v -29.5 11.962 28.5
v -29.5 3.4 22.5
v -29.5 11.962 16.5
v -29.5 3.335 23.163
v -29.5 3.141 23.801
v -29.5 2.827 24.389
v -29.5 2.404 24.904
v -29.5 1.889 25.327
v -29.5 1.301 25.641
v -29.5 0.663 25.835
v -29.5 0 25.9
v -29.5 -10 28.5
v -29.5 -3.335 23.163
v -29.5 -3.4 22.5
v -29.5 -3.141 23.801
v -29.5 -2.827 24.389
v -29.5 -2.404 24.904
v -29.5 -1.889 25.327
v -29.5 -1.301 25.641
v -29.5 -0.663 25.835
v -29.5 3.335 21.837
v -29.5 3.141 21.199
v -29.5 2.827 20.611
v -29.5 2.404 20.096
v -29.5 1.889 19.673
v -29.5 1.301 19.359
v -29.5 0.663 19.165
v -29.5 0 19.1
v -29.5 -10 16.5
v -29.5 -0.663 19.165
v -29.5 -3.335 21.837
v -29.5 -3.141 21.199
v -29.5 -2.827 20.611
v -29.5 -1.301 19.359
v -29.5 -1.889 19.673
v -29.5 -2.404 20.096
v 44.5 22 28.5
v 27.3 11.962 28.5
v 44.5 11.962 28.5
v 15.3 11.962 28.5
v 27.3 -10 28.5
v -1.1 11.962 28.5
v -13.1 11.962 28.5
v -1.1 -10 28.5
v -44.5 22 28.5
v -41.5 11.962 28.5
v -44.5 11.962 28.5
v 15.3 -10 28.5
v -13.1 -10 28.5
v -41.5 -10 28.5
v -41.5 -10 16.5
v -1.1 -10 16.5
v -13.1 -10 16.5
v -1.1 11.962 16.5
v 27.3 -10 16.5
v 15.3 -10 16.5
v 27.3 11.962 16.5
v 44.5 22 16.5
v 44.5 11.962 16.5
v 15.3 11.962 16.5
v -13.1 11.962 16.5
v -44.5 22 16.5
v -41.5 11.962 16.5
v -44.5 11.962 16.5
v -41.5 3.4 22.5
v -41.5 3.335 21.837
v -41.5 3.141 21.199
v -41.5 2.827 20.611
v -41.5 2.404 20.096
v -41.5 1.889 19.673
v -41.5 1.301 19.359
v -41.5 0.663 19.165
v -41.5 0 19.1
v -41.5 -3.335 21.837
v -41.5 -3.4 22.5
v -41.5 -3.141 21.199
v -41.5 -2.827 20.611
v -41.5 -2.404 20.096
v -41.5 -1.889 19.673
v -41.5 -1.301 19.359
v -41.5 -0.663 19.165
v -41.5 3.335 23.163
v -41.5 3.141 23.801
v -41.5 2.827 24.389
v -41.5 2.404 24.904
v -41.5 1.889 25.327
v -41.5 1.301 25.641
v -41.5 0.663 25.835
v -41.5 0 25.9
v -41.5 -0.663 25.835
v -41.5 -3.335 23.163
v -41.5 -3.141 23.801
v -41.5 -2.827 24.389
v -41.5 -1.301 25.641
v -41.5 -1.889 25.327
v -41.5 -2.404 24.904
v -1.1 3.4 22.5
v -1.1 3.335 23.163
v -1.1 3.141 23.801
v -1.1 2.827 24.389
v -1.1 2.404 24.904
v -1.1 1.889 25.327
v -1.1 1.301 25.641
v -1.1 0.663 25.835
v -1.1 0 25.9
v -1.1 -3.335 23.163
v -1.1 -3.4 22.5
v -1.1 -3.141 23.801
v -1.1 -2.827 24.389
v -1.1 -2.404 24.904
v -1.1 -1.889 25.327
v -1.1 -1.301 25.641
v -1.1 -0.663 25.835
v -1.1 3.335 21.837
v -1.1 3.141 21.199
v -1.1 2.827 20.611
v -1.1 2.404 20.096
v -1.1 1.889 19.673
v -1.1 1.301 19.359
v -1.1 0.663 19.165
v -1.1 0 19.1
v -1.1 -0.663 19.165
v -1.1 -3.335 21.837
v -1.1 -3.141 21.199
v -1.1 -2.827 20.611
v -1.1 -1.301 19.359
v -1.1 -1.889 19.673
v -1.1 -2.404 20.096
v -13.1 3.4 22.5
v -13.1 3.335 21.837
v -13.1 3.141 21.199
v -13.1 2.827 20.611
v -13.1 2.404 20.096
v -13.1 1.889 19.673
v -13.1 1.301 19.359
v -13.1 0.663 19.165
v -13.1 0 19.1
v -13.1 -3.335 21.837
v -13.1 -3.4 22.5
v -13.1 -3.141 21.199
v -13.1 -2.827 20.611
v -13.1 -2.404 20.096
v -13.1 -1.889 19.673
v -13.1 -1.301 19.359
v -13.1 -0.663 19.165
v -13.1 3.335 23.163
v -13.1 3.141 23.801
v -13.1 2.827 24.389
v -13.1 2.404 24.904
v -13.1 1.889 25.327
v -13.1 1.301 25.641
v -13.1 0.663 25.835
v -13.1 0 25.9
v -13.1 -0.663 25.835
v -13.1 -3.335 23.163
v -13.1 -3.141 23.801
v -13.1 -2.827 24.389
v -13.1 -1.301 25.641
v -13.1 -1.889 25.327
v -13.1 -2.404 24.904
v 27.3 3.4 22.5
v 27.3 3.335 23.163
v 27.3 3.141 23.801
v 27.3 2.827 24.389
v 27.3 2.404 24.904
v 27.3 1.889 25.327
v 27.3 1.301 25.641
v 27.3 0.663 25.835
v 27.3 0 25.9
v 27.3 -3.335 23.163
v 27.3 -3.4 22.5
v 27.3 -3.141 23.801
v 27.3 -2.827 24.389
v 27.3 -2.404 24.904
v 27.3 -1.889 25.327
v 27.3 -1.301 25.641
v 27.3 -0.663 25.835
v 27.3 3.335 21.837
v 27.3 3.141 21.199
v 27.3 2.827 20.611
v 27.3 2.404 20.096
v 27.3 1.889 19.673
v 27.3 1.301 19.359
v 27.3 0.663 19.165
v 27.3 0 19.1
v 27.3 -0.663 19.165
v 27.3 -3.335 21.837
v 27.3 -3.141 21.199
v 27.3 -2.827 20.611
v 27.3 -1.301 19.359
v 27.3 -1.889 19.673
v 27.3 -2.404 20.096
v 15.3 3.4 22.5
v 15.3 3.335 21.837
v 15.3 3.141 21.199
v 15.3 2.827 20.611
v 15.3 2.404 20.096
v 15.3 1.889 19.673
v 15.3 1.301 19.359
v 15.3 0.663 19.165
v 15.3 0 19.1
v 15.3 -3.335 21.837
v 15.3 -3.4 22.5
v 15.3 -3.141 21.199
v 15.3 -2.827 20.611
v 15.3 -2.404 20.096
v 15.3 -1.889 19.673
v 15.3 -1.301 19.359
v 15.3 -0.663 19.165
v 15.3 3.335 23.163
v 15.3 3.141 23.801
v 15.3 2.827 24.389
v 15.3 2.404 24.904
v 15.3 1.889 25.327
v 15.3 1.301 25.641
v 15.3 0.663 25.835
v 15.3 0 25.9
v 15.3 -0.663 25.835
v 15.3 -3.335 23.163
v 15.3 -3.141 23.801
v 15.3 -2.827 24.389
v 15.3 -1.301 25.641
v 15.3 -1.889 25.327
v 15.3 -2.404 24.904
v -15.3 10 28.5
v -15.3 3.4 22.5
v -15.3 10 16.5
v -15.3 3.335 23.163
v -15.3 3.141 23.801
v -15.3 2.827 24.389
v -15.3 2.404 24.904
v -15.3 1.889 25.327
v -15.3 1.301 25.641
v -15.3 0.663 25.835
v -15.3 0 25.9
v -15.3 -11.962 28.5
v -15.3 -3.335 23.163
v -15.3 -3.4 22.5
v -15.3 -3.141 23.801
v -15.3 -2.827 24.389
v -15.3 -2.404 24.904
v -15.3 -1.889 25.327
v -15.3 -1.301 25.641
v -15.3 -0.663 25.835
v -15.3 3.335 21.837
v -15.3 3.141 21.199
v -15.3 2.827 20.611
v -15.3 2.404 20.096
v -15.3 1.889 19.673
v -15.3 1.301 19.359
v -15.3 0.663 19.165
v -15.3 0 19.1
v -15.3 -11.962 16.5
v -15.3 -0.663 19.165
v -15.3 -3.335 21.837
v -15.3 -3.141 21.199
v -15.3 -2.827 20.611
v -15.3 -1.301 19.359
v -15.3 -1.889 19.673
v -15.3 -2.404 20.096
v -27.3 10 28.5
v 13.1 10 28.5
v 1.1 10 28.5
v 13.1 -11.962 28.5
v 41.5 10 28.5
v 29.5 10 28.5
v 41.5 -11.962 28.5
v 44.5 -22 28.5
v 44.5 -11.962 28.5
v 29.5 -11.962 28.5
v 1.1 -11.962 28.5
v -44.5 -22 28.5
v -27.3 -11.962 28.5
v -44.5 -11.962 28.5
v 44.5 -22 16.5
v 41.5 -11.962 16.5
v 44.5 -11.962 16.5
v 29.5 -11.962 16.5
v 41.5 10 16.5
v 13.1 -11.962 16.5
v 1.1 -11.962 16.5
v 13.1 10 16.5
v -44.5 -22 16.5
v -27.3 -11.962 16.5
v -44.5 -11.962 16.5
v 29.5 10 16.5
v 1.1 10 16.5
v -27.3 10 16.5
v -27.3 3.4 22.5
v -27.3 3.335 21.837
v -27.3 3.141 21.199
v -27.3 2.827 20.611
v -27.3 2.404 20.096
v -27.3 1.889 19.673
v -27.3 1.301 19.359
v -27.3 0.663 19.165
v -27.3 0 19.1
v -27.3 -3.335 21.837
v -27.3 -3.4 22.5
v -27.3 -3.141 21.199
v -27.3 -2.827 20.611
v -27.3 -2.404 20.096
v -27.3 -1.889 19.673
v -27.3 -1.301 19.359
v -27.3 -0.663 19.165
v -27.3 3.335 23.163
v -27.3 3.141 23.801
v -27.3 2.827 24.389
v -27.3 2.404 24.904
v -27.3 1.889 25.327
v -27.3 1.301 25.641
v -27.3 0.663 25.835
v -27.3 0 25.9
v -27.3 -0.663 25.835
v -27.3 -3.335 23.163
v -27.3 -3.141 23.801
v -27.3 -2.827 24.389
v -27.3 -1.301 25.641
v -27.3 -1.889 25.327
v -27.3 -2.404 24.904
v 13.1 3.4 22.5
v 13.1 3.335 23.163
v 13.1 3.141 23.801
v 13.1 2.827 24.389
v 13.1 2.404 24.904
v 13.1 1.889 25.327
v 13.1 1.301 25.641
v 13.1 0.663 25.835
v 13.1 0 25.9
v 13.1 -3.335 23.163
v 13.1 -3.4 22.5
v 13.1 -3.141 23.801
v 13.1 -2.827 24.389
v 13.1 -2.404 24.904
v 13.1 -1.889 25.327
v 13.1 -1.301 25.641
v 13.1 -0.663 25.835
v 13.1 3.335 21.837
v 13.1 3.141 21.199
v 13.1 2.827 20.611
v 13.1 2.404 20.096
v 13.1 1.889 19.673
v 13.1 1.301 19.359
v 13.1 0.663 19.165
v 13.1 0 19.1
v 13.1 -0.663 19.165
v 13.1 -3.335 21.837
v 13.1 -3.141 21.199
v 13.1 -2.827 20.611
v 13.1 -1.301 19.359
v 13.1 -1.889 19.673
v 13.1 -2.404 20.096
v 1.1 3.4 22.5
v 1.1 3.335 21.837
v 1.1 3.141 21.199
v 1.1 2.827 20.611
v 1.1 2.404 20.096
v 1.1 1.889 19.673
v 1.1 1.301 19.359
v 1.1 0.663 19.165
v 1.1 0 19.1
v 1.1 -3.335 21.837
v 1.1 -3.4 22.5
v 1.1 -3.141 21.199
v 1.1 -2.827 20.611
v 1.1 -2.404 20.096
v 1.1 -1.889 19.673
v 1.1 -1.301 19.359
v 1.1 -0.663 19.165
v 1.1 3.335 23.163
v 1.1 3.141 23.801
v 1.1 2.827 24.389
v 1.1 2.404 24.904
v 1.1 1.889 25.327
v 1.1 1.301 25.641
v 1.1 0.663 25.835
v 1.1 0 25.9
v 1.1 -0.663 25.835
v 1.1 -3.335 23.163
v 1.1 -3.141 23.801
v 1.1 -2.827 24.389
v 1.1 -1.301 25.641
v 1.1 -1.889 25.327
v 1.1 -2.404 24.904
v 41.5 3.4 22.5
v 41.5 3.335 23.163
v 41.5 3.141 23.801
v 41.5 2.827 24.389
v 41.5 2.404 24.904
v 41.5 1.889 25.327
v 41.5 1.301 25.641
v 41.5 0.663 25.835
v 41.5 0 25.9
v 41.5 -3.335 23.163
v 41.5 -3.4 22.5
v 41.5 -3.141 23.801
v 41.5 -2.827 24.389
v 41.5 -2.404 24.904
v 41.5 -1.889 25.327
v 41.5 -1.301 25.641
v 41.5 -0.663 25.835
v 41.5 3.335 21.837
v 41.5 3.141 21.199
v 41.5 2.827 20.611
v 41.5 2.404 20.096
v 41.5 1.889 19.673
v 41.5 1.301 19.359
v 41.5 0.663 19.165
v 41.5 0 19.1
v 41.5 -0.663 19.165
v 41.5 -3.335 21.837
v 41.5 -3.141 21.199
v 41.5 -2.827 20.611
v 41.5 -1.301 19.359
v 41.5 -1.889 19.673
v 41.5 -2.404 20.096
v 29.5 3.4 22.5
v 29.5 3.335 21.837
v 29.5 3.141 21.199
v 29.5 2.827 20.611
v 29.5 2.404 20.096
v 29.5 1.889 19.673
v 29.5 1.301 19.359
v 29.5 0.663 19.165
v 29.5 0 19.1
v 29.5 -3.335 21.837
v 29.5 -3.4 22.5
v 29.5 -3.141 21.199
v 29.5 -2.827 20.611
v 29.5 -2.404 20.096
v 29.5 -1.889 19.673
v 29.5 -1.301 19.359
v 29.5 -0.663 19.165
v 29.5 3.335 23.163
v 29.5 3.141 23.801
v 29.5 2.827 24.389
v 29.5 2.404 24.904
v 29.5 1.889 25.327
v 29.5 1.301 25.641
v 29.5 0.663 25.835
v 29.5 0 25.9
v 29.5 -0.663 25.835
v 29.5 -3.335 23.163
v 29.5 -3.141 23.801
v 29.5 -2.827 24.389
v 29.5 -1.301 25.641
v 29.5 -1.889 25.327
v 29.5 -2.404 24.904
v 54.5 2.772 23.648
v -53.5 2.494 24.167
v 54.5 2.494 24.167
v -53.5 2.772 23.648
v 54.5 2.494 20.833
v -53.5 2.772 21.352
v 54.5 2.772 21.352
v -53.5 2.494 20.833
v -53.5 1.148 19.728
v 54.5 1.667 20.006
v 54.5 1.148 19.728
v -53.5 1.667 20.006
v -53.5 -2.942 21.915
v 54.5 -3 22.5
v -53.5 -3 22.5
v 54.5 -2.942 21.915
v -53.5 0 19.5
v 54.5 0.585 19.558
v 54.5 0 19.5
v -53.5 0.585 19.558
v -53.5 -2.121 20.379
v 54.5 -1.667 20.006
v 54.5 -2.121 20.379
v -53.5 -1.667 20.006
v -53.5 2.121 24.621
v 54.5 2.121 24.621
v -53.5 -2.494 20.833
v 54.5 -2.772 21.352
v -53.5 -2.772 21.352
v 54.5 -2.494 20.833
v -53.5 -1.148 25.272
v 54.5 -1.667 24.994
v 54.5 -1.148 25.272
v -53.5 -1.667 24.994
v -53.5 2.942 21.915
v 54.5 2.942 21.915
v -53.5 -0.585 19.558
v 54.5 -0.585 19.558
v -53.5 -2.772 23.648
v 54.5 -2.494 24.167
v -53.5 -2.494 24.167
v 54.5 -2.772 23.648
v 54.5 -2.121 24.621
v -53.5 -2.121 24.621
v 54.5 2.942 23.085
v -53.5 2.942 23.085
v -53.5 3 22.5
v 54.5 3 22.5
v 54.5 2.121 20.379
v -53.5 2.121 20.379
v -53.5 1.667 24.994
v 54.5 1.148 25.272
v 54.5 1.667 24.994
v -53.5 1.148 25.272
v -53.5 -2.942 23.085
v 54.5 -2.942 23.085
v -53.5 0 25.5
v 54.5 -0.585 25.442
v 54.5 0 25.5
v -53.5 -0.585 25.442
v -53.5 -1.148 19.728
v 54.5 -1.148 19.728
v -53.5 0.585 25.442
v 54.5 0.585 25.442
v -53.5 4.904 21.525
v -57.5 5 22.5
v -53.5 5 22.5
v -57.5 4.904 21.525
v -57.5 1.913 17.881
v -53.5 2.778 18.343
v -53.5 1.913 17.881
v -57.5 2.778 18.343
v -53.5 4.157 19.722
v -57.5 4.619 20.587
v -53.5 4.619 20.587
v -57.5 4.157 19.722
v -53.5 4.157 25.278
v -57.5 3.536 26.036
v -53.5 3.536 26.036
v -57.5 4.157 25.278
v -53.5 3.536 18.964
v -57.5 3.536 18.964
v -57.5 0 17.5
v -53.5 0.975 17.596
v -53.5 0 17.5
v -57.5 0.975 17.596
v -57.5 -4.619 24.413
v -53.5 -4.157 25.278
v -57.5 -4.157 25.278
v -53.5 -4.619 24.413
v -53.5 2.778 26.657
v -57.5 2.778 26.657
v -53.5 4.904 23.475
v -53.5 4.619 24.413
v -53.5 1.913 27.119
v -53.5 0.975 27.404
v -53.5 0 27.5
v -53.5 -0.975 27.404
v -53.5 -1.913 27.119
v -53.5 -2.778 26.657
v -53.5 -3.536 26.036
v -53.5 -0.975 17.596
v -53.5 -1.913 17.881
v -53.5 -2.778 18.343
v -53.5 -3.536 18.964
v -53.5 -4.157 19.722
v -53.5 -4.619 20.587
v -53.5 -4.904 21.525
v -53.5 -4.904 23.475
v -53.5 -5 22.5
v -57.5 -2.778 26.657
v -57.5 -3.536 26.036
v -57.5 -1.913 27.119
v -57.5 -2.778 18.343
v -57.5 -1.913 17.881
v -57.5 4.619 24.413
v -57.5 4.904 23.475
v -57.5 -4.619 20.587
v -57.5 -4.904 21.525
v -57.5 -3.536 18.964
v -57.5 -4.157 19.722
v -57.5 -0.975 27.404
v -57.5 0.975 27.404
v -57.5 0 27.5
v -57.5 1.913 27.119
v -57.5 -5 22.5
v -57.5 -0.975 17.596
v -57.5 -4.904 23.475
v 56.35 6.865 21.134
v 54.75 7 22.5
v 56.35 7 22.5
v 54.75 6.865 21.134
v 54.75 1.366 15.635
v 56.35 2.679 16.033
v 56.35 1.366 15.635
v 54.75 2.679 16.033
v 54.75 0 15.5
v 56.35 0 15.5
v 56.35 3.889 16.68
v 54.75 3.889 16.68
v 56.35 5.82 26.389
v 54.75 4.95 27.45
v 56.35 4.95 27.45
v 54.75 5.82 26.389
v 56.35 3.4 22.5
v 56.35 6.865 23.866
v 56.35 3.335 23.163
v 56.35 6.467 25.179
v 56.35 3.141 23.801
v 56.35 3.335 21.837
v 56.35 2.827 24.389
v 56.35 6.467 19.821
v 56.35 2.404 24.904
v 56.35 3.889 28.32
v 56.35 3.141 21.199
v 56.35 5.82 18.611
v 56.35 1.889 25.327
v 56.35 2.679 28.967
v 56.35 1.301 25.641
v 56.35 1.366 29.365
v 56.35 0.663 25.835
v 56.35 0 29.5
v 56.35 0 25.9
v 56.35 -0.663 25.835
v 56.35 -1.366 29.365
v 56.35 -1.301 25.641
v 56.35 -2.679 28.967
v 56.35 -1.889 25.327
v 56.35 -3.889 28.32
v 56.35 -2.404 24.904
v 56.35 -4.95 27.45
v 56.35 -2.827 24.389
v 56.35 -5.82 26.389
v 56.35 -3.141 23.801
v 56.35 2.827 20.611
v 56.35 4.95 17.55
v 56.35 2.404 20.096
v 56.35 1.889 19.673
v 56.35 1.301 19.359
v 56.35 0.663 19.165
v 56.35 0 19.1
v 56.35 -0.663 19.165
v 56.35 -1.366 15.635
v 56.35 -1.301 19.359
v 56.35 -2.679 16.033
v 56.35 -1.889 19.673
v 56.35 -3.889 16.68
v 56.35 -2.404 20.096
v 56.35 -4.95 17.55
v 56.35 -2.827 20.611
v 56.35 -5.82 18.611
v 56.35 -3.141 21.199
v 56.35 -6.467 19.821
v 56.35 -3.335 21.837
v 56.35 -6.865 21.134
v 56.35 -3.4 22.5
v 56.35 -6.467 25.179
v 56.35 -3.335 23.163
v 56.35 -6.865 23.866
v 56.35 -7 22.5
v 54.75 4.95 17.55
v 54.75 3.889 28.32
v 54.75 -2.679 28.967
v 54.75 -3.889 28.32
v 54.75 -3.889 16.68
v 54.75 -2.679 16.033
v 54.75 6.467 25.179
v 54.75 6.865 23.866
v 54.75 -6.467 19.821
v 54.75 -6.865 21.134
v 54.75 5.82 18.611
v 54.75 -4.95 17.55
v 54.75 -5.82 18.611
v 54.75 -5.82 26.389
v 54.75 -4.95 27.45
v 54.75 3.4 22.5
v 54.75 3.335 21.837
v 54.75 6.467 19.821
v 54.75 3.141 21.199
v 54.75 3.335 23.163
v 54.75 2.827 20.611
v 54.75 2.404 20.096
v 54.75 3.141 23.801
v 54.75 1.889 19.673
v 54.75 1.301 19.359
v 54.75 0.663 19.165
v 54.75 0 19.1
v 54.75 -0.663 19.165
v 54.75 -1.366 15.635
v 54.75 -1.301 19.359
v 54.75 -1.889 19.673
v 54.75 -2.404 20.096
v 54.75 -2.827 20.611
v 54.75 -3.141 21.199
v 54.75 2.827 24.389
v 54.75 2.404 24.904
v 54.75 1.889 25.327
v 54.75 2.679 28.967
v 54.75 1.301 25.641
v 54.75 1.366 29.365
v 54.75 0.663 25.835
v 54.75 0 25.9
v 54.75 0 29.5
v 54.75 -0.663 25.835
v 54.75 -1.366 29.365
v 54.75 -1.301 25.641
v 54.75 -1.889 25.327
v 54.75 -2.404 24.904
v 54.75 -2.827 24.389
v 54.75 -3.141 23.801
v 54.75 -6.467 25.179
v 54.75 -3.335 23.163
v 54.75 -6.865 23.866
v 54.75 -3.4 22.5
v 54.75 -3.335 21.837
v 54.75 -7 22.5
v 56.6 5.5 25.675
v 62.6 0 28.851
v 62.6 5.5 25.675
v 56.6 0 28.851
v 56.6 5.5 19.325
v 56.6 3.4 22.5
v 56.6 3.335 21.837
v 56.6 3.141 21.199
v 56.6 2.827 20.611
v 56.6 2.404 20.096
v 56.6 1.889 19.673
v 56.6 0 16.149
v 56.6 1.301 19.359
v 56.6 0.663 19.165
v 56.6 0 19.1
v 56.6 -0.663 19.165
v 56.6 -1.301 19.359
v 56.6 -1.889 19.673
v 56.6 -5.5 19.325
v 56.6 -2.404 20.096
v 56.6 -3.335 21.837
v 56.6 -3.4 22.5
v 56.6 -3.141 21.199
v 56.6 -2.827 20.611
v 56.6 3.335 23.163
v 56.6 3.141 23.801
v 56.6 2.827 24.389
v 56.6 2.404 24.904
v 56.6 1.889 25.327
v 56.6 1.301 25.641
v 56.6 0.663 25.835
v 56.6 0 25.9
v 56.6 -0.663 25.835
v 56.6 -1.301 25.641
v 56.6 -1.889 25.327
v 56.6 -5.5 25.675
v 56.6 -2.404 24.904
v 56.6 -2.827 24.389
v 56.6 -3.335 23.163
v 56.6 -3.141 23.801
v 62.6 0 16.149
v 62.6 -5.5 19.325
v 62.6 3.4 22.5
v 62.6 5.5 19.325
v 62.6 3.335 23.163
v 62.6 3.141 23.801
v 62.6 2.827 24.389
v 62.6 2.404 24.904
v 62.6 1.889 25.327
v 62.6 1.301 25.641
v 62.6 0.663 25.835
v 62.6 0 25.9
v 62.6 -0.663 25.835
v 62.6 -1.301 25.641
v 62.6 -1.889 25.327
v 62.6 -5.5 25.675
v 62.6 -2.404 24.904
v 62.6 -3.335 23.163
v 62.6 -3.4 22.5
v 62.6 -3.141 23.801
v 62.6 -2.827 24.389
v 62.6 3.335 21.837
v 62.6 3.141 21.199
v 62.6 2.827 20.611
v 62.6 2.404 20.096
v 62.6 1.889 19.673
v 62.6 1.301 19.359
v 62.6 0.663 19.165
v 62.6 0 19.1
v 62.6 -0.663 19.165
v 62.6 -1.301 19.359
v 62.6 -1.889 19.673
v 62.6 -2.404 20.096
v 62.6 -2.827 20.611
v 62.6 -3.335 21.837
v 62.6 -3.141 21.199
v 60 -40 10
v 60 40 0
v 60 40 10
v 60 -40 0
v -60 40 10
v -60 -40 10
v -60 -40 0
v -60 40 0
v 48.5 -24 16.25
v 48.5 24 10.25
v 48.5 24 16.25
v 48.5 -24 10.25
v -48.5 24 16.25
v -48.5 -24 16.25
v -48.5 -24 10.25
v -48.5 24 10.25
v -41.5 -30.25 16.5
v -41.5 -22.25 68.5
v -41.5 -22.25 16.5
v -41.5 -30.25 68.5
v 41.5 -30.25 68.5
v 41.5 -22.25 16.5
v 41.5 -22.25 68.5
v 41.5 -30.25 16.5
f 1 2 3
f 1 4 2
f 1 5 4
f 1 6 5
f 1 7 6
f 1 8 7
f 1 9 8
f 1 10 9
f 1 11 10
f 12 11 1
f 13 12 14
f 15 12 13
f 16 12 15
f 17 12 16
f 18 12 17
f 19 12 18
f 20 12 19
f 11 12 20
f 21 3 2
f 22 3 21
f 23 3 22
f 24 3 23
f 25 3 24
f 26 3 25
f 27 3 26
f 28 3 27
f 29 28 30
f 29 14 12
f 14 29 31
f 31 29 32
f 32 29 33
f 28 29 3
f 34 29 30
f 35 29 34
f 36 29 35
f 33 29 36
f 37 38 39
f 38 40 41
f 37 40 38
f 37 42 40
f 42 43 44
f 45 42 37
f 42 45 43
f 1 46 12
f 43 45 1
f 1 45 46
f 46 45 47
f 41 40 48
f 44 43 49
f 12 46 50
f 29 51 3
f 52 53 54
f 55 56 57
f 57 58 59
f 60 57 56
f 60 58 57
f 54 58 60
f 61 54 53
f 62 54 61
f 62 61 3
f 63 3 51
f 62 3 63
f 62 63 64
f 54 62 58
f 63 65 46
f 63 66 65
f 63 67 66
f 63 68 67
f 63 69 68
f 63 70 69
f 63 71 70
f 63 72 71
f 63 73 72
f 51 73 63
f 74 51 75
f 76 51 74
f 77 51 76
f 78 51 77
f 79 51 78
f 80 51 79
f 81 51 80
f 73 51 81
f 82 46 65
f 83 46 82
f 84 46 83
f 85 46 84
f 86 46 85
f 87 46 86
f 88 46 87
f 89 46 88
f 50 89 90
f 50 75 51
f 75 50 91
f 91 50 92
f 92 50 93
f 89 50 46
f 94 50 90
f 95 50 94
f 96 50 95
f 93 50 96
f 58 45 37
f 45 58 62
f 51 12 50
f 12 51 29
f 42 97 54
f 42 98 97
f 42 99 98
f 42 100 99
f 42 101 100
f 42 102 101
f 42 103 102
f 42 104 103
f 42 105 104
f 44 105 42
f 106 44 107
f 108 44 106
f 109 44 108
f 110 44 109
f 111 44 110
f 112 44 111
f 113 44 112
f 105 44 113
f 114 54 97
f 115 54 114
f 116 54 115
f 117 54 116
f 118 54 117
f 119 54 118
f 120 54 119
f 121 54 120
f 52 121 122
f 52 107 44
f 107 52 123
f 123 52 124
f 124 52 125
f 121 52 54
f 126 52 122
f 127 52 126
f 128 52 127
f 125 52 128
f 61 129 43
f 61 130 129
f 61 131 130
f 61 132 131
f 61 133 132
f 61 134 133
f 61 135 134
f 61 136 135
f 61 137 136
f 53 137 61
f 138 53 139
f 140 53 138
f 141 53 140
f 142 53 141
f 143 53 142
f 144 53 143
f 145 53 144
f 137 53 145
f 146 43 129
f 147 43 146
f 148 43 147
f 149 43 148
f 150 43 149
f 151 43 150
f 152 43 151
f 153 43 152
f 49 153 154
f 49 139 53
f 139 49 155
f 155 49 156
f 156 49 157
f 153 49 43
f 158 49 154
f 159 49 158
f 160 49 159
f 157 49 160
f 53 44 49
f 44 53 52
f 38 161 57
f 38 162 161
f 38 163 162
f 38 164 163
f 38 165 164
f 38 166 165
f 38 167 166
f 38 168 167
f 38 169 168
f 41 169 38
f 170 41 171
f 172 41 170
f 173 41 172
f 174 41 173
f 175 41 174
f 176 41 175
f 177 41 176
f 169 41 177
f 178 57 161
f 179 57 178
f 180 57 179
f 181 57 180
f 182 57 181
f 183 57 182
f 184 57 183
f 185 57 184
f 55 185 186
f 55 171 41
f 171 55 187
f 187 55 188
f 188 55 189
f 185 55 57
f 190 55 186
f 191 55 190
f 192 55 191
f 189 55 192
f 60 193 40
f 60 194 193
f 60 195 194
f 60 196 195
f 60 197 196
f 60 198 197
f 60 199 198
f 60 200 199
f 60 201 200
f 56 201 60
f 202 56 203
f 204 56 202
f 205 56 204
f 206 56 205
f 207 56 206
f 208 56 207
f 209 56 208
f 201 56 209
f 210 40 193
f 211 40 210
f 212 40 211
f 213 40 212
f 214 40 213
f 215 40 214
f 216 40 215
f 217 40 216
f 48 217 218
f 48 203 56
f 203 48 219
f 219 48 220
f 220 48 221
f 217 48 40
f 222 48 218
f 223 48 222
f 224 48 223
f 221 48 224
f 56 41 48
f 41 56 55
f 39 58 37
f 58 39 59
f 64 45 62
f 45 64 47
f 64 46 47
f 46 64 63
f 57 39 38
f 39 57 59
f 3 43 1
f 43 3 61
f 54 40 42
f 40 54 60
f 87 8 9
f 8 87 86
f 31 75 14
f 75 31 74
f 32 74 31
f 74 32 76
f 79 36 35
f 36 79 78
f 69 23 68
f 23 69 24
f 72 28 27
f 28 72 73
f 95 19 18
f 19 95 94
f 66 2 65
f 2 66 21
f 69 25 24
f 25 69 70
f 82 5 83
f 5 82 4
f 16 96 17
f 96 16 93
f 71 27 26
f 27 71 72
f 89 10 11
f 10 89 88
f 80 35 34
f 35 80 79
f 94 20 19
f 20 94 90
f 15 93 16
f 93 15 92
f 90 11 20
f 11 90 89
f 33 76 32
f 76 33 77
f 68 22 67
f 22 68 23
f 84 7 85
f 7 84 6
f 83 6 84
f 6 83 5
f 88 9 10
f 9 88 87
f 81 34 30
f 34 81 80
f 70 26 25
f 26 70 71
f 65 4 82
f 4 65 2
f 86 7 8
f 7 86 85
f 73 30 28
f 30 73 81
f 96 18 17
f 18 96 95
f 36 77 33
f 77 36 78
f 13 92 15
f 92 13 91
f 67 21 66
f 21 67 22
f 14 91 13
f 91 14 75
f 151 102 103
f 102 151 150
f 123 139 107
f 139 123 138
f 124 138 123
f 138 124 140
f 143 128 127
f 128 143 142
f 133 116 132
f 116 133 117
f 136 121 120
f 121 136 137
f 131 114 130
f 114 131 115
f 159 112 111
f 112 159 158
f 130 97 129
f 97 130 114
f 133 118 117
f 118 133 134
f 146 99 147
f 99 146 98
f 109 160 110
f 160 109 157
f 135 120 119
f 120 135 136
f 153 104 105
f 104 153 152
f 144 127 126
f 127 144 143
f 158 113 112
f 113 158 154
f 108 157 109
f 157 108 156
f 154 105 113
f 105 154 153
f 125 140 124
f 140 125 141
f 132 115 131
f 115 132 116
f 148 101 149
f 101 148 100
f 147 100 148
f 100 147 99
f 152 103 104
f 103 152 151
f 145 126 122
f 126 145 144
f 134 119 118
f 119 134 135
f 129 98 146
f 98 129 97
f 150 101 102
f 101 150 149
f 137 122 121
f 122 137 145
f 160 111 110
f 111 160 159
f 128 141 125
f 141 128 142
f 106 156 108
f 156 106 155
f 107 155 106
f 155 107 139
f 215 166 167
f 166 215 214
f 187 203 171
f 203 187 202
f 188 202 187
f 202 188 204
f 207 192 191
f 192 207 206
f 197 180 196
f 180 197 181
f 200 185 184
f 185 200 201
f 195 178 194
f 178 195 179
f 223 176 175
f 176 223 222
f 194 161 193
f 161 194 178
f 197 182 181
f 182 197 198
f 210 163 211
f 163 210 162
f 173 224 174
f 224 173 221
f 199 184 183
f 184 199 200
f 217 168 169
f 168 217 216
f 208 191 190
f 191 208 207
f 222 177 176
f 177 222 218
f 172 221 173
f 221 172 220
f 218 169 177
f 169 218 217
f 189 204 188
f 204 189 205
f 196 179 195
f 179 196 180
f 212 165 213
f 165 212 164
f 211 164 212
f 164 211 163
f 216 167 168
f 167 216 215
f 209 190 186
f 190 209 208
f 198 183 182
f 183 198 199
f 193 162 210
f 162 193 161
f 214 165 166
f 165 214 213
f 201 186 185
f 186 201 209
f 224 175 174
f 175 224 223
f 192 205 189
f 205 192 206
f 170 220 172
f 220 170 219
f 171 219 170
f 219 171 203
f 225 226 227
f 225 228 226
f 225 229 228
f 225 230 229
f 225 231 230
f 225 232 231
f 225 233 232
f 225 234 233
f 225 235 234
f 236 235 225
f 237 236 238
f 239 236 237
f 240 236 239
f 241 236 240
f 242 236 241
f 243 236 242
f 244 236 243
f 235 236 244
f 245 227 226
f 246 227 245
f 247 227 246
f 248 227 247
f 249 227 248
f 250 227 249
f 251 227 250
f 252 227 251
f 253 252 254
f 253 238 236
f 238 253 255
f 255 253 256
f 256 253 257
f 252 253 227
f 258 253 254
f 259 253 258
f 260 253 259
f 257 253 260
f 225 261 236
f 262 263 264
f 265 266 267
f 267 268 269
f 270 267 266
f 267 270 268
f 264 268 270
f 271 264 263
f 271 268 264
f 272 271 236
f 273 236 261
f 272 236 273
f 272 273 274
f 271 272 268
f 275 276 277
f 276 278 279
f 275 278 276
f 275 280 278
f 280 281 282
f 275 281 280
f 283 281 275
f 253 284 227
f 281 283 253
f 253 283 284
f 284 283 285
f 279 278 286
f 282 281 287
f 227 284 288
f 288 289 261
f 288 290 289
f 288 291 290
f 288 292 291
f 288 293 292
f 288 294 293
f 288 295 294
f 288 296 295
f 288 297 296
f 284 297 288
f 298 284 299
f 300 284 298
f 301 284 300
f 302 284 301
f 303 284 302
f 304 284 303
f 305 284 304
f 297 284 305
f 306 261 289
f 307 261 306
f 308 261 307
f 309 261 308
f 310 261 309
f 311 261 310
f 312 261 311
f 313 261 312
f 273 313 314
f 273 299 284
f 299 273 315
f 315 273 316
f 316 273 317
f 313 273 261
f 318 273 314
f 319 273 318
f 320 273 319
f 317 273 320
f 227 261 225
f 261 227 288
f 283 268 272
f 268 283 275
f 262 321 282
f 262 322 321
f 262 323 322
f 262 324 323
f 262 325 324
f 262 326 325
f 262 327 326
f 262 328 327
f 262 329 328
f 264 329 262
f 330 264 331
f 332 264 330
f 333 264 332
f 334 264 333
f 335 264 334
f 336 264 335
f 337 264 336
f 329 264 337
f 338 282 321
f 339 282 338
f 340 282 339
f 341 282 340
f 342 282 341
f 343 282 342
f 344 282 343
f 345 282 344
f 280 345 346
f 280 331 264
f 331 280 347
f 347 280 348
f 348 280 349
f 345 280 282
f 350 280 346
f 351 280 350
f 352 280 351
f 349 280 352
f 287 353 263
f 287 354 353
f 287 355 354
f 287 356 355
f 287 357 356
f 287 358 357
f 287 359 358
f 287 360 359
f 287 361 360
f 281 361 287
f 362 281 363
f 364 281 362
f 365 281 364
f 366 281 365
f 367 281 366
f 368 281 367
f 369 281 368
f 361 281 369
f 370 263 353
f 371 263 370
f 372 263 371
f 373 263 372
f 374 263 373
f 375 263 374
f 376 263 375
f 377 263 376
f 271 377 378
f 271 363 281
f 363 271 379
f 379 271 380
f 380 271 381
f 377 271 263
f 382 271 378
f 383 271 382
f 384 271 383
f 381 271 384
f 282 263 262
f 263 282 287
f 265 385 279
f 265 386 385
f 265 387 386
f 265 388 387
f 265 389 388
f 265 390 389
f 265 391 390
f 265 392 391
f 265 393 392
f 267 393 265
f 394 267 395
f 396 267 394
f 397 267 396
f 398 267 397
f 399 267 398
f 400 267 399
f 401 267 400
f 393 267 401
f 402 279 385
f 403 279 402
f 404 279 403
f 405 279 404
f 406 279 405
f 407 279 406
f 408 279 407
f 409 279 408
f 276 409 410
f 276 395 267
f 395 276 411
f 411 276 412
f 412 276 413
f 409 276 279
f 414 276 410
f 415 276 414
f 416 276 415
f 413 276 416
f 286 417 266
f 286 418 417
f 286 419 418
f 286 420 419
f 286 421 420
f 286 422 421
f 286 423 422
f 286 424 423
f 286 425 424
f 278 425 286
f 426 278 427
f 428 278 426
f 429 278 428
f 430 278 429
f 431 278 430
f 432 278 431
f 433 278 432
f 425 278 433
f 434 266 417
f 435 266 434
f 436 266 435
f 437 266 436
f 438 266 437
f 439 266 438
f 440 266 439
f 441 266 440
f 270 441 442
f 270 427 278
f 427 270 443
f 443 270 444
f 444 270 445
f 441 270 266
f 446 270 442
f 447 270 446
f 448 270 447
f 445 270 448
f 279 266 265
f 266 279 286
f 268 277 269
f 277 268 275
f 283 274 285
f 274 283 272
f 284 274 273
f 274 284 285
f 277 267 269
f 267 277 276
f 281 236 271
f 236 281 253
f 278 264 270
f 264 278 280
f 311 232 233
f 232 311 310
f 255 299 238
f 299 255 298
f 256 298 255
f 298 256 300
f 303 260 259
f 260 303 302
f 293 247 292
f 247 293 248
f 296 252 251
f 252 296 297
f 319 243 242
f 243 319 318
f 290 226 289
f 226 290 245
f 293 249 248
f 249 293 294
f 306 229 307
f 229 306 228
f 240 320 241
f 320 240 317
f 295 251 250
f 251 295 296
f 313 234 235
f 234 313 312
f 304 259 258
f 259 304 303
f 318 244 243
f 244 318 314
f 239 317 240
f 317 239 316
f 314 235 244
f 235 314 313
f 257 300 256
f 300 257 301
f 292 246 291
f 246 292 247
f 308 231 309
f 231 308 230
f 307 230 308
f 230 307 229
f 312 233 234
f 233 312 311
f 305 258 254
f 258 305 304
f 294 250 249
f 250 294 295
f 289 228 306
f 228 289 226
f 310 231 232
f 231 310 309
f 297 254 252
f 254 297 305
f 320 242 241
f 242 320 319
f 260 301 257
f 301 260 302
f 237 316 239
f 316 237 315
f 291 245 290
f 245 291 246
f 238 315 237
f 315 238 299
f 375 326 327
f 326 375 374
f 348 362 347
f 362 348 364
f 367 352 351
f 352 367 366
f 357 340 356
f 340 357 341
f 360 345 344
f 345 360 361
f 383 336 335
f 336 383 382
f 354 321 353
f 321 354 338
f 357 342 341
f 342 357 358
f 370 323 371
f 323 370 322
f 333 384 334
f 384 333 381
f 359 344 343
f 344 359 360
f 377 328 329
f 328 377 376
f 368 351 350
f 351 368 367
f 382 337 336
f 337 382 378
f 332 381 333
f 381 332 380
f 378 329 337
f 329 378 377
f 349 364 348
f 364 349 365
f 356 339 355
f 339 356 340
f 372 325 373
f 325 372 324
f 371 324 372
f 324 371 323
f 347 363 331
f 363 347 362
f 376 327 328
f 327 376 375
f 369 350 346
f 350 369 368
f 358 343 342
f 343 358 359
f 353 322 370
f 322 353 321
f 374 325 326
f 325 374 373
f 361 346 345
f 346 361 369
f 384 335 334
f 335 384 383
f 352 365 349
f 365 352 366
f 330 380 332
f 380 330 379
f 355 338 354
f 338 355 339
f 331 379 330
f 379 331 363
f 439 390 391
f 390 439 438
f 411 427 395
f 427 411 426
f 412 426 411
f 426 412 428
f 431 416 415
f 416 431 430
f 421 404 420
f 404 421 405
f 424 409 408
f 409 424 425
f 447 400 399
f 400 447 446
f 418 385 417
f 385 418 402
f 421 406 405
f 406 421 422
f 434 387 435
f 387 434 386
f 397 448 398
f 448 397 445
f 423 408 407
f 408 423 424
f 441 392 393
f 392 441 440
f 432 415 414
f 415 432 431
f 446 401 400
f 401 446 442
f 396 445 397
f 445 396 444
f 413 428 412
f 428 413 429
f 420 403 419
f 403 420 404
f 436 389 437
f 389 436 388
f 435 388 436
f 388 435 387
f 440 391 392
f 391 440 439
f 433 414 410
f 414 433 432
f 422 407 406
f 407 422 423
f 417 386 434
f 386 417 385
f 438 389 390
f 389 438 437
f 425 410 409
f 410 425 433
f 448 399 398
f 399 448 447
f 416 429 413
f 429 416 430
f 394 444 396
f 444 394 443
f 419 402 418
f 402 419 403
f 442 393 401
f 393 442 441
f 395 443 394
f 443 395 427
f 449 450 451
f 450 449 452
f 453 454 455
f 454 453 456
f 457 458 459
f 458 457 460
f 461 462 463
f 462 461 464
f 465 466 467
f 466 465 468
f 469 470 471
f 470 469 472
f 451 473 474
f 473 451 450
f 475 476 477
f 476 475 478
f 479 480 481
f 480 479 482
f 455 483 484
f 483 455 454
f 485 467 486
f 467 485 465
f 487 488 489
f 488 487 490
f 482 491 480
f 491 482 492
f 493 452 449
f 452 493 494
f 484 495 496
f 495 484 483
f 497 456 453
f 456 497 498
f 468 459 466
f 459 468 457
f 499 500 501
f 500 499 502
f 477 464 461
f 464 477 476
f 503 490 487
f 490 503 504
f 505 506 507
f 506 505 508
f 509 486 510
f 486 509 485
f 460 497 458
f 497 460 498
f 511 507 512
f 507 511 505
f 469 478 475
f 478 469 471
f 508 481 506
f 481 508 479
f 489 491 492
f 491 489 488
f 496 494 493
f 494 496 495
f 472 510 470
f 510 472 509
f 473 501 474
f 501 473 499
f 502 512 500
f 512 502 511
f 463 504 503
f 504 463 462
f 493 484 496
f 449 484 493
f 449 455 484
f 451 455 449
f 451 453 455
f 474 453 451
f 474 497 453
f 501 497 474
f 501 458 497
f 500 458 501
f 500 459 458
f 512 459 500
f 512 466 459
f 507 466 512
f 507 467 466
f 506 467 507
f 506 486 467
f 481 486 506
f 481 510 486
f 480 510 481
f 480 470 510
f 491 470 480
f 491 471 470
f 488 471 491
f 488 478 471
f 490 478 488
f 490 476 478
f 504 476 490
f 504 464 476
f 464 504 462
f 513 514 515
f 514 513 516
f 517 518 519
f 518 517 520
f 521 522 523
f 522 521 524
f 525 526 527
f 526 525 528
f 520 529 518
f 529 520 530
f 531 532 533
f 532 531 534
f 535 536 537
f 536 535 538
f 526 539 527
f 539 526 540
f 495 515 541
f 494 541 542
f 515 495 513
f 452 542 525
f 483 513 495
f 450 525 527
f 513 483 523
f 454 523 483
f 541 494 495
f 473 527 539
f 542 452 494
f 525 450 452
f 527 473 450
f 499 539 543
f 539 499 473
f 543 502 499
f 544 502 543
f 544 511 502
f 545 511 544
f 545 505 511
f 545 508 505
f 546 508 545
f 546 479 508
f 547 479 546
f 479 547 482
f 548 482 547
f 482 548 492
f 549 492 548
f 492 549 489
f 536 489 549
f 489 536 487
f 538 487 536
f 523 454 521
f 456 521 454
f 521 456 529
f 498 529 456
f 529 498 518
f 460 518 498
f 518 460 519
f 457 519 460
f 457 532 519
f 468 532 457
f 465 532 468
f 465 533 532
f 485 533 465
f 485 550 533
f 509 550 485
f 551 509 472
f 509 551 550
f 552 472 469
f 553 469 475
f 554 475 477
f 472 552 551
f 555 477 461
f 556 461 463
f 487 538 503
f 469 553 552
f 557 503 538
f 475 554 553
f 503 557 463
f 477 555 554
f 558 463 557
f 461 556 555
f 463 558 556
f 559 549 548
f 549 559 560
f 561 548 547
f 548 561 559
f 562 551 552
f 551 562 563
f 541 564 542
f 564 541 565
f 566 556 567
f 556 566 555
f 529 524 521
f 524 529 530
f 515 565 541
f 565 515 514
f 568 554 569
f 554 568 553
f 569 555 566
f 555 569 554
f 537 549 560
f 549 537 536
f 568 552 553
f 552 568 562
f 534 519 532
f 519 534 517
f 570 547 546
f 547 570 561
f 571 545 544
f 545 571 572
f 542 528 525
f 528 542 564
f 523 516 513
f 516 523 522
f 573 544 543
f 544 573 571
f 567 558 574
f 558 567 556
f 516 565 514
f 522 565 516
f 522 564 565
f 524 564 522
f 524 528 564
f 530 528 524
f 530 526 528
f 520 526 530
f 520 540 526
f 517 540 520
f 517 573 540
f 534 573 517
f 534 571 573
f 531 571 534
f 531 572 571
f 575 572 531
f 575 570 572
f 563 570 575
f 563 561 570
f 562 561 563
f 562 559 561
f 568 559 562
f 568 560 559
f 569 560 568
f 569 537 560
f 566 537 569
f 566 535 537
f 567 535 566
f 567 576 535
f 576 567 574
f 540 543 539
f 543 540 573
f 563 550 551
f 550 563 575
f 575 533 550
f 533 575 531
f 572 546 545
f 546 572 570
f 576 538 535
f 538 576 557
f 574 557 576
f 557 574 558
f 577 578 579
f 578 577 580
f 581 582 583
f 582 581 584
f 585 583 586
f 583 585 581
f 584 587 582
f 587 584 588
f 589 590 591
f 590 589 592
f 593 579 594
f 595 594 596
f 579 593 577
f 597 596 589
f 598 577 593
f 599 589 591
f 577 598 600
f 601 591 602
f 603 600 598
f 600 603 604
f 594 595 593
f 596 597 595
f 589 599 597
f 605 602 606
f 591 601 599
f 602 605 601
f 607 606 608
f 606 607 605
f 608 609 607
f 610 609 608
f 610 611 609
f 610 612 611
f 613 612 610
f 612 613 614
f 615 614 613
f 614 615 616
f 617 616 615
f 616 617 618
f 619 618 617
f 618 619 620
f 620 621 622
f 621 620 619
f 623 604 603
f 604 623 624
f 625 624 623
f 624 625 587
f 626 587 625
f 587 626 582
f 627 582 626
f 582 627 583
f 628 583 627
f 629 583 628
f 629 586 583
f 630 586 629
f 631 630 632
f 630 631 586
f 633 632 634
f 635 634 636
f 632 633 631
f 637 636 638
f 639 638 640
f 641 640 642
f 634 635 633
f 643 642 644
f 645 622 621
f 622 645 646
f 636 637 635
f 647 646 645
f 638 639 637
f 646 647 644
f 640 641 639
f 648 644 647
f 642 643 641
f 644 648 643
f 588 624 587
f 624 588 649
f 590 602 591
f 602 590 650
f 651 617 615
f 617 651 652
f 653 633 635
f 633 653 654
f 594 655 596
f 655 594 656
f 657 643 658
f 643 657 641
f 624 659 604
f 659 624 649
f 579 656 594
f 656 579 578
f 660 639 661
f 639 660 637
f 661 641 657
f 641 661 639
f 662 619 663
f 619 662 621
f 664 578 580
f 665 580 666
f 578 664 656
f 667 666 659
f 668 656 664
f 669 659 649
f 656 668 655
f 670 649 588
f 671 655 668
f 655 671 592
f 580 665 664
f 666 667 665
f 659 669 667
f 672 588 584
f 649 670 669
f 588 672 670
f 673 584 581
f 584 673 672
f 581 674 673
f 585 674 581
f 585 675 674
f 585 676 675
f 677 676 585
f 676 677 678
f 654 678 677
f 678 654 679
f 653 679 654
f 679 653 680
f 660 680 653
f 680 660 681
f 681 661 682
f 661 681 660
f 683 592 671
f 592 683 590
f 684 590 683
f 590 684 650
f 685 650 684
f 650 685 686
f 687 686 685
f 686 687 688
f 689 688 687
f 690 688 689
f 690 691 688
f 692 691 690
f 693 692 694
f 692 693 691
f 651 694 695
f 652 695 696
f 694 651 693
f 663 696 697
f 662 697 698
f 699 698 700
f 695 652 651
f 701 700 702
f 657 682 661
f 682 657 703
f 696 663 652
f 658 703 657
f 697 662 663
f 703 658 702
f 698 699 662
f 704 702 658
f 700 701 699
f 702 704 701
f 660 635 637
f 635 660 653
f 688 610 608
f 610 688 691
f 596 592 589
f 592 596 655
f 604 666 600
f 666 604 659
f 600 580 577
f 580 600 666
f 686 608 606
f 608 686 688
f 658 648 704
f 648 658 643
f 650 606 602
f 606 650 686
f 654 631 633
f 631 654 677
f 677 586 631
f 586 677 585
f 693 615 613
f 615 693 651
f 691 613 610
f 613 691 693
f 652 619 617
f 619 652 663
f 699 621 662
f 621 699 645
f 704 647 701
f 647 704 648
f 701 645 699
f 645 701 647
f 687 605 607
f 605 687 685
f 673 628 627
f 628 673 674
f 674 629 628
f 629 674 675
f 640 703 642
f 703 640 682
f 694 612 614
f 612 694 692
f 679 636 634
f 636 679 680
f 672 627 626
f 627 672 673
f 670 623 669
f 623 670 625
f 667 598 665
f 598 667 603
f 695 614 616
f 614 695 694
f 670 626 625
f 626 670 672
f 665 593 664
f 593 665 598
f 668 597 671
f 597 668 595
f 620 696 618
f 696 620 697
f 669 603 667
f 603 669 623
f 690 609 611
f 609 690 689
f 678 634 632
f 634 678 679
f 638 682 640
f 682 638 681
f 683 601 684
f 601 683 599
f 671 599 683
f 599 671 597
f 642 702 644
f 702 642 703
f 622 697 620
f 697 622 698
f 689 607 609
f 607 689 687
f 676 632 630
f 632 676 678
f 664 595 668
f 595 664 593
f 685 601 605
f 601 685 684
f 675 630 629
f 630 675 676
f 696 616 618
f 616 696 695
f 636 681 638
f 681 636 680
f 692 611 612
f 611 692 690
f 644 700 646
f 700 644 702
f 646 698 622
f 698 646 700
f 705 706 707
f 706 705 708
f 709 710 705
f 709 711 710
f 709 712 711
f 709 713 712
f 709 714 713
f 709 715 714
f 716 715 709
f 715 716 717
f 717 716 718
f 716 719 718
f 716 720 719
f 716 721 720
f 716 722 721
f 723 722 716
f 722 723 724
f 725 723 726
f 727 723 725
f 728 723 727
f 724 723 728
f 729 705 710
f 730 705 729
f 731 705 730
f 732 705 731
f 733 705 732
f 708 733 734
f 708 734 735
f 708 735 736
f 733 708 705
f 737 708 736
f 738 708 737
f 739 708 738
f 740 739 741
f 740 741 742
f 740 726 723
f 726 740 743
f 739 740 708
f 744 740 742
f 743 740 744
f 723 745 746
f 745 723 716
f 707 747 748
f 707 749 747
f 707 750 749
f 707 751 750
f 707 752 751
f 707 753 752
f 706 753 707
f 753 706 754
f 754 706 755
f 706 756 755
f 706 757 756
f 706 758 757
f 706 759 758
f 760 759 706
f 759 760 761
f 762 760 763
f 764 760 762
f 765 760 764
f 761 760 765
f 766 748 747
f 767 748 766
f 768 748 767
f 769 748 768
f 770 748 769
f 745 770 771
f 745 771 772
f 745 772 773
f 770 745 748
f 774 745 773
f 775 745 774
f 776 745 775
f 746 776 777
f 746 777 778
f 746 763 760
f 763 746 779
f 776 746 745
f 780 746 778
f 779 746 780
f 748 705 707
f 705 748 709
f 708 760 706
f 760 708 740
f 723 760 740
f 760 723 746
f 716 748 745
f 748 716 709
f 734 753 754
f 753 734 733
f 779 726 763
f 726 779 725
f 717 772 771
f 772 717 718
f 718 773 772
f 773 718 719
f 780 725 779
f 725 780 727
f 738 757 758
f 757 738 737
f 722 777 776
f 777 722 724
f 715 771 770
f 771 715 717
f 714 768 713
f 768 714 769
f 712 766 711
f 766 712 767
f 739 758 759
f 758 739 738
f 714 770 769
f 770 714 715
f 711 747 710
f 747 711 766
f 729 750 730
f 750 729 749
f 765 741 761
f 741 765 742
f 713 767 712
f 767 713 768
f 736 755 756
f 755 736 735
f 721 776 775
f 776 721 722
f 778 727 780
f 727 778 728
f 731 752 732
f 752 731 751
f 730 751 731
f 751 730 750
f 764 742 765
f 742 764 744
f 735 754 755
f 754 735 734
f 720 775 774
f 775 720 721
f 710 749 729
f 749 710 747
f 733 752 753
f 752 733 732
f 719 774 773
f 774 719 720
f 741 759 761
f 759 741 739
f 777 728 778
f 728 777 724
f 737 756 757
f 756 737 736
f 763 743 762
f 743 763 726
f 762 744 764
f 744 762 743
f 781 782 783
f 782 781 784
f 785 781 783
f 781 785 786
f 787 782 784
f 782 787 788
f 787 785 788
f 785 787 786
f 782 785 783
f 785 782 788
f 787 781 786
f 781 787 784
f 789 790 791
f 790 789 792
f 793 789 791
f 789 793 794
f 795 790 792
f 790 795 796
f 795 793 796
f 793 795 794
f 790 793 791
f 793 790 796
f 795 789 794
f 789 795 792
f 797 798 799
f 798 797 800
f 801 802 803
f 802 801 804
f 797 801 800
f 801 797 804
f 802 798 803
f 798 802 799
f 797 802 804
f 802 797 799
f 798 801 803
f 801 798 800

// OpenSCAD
$fn = 32;

// ------------------------------------------------------------------------
// Comb hinge with flap: leaf 89 x 22 mm, pin d6, flap 52 mm
// Every part is its own module, assembly() places every instance.
// ------------------------------------------------------------------------

// --- part 1 ---
module hinge_bed() {
  difference() {
    translate([-60, -40, 0]) cube([120, 80, 10]);
  }
}

// --- part 2 ---
module hinge_riser() {
  difference() {
    translate([-48.5, -24, 0]) cube([97, 48, 6]);
  }
}

// --- part 3 ---
module hinge_leaf_a() {
  difference() {
    union() {
      translate([-41.5, -10, -6]) cube([12, 32, 12]);
      translate([-13.1, -10, -6]) cube([12, 32, 12]);
      translate([15.3, -10, -6]) cube([12, 32, 12]);
      translate([-44.5, 11.962, -6]) cube([89, 10.038, 12]);
    }
    translate([-35.5, 0, 0]) rotate([0, 90, 0]) cylinder(h = 14, d = 6.8, center = true);
    translate([-7.1, 0, 0]) rotate([0, 90, 0]) cylinder(h = 14, d = 6.8, center = true);
    translate([21.3, 0, 0]) rotate([0, 90, 0]) cylinder(h = 14, d = 6.8, center = true);
  }
}

// --- part 4 ---
module hinge_leaf_b() {
  difference() {
    union() {
      translate([-27.3, -22, -6]) cube([12, 32, 12]);
      translate([1.1, -22, -6]) cube([12, 32, 12]);
      translate([29.5, -22, -6]) cube([12, 32, 12]);
      translate([-44.5, -22, -6]) cube([89, 10.038, 12]);
    }
    translate([-21.3, 0, 0]) rotate([0, 90, 0]) cylinder(h = 14, d = 6.8, center = true);
    translate([7.1, 0, 0]) rotate([0, 90, 0]) cylinder(h = 14, d = 6.8, center = true);
    translate([35.5, 0, 0]) rotate([0, 90, 0]) cylinder(h = 14, d = 6.8, center = true);
  }
}

// --- part 5 ---
module hinge_flap() {
  difference() {
    translate([-41.5, -26, 0]) cube([83, 52, 8]);
  }
}

// --- part 6 ---
module hinge_pin() {
  rotate([0, 90, 0]) cylinder(h = 109, d = 6, center = true);
  translate([-57.5, 0, 0]) rotate([0, 90, 0]) cylinder(h = 4, d = 10);
}

// --- part 7 ---
module pin_washer() {
  difference() {
      translate([0, 0, 0]) cylinder(h = 1.6, d = 14);
      translate([0, 0, -1]) cylinder(h = 3.6, d = 6.8);
    }
}

// --- part 8 ---
module pin_nut() {
  difference() {
    linear_extrude(height = 6) polygon(points = [[6.351, 0], [3.175, 5.5], [-3.175, 5.5], [-6.351, 0], [-3.175, -5.5], [3.175, -5.5]]);
    translate([0, 0, -1]) cylinder(h = 8, d = 6.8);
  }
}

// --- assembly ---
module assembly() {
  color([0.80, 0.24, 0.20]) translate([0, 0, 0]) rotate([0, 0, 0]) hinge_bed();
  color([0.20, 0.45, 0.75]) translate([0, 0, 10.25]) rotate([0, 0, 0]) hinge_riser();
  color([0.25, 0.62, 0.32]) translate([0, 0, 22.5]) rotate([0, 0, 0]) hinge_leaf_a();
  color([0.92, 0.70, 0.18]) translate([0, 0, 22.5]) rotate([0, 0, 0]) hinge_leaf_b();
  color([0.58, 0.35, 0.70]) translate([0, -22.25, 42.5]) rotate([90, 0, 0]) hinge_flap();
  color([0.16, 0.66, 0.66]) translate([0, 0, 22.5]) rotate([0, 0, 0]) hinge_pin();
  color([0.85, 0.48, 0.18]) translate([54.75, 0, 22.5]) rotate([0, 90, 0]) pin_washer();
  color([0.55, 0.60, 0.65]) translate([56.6, 0, 22.5]) rotate([0, 90, 0]) pin_nut();
}

assembly();
